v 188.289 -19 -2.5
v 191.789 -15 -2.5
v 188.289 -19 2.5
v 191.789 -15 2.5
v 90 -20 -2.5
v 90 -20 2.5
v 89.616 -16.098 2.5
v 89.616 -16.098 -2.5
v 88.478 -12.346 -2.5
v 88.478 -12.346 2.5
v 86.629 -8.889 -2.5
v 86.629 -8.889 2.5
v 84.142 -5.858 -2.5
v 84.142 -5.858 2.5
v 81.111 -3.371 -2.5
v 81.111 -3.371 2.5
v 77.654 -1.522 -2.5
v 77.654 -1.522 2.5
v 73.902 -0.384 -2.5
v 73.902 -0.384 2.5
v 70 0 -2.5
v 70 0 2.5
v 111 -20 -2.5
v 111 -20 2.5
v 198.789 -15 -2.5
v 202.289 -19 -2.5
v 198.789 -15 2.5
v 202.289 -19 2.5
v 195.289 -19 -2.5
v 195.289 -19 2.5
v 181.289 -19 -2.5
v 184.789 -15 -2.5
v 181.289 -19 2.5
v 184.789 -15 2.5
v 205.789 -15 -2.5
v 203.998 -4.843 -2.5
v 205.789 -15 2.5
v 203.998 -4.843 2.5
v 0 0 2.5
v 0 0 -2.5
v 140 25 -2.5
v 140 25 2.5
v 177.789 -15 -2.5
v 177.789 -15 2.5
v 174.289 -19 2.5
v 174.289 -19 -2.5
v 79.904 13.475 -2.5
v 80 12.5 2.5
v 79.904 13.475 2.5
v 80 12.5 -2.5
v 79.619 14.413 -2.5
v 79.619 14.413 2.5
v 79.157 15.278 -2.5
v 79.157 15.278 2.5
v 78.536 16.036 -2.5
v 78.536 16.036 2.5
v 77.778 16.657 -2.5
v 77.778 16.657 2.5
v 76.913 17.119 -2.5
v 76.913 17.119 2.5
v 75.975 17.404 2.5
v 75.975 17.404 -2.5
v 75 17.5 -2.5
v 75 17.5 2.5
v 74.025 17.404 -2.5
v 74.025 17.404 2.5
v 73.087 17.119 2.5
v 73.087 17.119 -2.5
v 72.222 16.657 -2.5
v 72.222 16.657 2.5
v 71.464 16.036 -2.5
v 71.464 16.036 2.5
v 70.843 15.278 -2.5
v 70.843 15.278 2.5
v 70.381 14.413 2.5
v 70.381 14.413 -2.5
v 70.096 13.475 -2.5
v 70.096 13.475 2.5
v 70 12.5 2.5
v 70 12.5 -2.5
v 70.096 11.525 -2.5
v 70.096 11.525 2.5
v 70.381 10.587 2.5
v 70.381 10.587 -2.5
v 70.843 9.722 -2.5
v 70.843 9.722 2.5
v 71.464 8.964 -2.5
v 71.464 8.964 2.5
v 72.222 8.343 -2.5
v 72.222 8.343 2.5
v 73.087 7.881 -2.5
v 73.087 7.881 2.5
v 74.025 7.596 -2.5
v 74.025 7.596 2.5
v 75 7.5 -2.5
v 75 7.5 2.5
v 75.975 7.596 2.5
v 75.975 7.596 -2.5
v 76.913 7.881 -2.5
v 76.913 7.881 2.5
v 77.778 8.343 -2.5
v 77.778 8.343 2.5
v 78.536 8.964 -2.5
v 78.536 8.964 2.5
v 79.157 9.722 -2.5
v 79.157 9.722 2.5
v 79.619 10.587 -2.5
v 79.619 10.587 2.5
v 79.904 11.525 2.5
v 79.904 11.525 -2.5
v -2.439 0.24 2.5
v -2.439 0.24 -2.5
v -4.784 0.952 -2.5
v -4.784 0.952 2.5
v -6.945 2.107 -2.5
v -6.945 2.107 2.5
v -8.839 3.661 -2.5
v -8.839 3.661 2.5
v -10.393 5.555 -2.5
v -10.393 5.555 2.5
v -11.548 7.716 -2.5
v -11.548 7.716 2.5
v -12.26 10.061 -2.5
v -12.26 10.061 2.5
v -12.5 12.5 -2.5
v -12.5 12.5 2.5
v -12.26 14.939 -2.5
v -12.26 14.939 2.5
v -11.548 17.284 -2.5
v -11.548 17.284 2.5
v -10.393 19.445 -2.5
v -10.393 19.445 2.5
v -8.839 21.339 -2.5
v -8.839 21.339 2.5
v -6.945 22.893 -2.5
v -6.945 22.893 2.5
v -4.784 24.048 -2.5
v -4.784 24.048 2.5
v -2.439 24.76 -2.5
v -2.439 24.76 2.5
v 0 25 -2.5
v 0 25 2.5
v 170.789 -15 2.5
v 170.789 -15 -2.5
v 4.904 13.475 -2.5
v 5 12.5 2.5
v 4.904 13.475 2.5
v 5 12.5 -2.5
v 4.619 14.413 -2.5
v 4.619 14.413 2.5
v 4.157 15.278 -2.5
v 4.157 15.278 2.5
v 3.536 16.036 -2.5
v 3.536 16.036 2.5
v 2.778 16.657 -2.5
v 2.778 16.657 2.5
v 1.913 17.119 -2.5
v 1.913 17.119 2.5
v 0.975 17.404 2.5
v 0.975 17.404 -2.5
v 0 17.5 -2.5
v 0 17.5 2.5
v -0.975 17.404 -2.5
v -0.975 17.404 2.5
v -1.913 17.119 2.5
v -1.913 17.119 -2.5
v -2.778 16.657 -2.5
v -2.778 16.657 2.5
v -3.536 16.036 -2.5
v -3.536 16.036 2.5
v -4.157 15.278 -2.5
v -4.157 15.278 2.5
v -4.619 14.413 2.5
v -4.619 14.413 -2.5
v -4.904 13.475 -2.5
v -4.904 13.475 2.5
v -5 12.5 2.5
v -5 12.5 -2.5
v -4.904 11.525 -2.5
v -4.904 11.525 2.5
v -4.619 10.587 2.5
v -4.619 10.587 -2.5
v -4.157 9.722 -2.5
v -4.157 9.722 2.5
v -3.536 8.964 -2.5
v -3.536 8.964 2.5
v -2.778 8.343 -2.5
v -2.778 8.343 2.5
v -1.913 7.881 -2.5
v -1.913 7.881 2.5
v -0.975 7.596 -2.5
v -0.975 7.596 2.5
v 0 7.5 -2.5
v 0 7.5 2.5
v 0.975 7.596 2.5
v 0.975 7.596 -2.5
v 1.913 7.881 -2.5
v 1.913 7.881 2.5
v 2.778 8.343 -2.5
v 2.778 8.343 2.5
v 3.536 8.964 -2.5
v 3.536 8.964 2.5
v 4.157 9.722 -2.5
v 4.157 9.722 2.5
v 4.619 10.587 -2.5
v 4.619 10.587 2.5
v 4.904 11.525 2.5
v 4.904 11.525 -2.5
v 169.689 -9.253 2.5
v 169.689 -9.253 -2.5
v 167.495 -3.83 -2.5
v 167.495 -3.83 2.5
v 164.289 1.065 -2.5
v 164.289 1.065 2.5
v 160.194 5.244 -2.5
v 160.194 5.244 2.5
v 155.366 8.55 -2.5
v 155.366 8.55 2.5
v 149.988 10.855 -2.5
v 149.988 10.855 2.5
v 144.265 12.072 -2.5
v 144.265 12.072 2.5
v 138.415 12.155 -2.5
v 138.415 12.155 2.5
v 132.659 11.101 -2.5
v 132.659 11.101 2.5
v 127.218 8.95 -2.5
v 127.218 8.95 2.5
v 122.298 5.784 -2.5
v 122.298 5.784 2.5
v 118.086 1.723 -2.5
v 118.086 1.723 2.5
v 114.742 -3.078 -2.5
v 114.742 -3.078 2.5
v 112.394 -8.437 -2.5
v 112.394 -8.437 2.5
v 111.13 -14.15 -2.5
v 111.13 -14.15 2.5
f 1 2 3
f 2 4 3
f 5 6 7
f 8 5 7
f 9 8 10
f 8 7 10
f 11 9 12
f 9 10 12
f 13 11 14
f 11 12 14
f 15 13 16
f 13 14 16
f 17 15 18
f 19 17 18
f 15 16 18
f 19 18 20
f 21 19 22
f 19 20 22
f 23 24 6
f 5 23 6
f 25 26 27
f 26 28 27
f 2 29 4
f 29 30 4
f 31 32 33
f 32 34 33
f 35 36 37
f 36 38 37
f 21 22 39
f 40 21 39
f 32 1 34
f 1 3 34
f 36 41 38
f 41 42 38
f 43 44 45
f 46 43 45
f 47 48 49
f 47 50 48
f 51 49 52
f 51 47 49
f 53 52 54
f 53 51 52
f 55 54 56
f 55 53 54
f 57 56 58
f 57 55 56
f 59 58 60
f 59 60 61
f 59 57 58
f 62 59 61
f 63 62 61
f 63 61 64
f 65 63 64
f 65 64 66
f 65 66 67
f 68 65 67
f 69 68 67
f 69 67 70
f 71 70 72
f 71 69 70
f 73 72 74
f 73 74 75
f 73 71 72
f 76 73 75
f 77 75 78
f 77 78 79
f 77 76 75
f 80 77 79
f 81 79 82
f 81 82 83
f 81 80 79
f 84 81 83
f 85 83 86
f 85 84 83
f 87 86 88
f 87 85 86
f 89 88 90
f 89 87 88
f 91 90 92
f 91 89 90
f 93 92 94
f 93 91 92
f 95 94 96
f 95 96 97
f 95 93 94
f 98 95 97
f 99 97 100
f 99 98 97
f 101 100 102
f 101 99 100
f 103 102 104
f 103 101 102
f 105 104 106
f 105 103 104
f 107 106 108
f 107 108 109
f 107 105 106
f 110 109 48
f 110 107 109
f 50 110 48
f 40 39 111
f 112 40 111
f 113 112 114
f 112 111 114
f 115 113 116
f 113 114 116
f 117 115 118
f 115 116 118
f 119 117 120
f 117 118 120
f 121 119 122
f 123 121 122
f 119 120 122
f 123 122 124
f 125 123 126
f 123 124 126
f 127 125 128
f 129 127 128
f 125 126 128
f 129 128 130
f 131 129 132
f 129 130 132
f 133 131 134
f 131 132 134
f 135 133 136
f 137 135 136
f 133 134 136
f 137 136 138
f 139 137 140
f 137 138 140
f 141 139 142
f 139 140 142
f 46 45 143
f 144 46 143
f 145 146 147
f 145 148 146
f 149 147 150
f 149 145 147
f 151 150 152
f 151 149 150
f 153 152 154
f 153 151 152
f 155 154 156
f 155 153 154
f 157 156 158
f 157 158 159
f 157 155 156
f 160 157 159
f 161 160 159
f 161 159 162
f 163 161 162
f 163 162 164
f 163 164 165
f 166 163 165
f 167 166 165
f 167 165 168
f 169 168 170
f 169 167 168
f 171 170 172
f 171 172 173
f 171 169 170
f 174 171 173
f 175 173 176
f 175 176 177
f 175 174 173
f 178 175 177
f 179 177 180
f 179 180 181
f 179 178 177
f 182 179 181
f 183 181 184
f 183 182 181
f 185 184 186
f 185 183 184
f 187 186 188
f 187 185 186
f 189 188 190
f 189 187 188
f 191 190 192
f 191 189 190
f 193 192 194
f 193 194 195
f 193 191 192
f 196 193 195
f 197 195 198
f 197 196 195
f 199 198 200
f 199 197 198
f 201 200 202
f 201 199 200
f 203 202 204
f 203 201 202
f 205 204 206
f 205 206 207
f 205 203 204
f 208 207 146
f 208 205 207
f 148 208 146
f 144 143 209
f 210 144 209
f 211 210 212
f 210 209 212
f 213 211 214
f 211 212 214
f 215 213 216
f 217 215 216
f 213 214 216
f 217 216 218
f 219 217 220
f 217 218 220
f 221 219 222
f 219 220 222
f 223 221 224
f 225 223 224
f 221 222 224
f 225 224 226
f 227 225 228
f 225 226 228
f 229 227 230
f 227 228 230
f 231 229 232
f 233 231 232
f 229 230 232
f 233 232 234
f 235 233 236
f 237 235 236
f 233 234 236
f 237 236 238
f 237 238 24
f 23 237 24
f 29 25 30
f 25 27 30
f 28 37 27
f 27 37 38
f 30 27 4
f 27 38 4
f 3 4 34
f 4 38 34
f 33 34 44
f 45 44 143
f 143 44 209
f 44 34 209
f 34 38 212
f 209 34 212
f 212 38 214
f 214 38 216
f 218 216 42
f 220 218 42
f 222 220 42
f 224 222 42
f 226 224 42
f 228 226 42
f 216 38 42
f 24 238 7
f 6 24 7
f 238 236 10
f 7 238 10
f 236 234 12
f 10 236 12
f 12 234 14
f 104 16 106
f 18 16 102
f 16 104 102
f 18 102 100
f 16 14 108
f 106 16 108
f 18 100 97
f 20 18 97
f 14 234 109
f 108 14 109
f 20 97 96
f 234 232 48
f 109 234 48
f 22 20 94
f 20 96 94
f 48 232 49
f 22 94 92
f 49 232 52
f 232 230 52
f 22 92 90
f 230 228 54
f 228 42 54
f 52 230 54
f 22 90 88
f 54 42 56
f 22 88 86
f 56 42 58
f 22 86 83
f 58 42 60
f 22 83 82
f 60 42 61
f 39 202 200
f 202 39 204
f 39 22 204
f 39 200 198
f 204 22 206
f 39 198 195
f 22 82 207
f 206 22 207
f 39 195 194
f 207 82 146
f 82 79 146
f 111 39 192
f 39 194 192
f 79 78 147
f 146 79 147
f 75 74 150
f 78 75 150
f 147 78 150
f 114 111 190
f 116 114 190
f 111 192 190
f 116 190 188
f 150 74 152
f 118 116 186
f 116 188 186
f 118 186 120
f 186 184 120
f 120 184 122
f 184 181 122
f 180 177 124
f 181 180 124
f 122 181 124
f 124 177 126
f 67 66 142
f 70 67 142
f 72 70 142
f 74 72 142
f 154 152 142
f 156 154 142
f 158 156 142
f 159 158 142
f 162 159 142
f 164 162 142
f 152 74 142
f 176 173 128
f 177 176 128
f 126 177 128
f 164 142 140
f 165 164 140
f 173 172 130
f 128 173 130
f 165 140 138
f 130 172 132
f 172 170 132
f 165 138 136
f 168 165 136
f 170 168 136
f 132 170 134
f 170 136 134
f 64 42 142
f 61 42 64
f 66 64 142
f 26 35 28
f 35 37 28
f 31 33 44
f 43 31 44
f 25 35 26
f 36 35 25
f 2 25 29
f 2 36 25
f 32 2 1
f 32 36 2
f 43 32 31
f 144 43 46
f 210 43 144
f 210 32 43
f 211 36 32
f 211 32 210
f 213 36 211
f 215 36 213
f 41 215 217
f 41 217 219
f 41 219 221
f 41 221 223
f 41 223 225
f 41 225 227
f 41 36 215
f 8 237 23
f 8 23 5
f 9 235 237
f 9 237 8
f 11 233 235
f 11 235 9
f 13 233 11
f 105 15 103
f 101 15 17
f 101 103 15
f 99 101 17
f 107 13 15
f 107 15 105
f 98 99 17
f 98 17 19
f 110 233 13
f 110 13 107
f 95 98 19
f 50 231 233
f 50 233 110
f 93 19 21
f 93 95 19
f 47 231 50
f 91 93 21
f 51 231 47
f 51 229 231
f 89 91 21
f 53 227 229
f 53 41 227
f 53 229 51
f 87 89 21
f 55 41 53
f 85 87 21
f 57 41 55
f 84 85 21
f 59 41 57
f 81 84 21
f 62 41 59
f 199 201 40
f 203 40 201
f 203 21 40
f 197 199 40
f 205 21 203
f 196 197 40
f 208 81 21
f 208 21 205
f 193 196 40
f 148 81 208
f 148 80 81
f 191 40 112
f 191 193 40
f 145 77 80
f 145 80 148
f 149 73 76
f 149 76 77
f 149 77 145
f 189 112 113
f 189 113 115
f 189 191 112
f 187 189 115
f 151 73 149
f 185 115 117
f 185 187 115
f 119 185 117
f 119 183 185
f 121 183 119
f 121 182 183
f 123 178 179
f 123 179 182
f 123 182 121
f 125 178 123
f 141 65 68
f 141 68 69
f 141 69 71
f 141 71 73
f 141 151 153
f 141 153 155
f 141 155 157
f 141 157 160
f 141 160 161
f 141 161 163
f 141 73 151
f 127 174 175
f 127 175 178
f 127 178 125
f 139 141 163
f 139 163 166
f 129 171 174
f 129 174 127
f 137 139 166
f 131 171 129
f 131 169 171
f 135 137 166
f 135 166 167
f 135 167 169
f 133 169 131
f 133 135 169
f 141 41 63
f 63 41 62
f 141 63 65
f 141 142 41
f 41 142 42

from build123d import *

# Parameters (mm, degrees)
SKETCH1_R           = 5
BOSS_EXTRUDE1_DEPTH = 2.5


with BuildPart() as part:
    # Sketch1 → Boss-Extrude1 (new, symmetric)
    with BuildSketch(Plane.XY):
        with BuildLine():
            Line((0, 25), (140, 25))
            Line((140, 25), (203.998392257, -4.842940419))
            Line((203.998392257, -4.842940419), (205.789355906, -15))
            Line((205.789355906, -15), (202.289355906, -19))
            Line((202.289355906, -19), (198.789355906, -15))
            Line((198.789355906, -15), (195.289355906, -19))
            Line((195.289355906, -19), (191.789355906, -15))
            Line((191.789355906, -15), (188.289355906, -19))
            Line((188.289355906, -19), (184.789355906, -15))
            Line((184.789355906, -15), (181.289355906, -19))
            Line((181.289355906, -19), (177.789355906, -15))
            Line((177.789355906, -15), (174.289355906, -19))
            Line((174.289355906, -19), (170.789355906, -15))
            ThreePointArc((170.789355906, -15), (138.414706816, 12.155175392), (111, -20))
            Line((111, -20), (90, -20))
            ThreePointArc((90, -20), (84.142135624, -5.857864376), (70, 0))
            Line((70, 0), (0, 0))
            ThreePointArc((0, 0), (-12.5, 12.5), (0, 25))
        make_face()
        with Locations((75, 12.5)):
            Circle(SKETCH1_R, mode=Mode.SUBTRACT)
        with Locations((0, 12.5)):
            Circle(SKETCH1_R, mode=Mode.SUBTRACT)
    extrude(amount=BOSS_EXTRUDE1_DEPTH, both=True)


solid = part.part
